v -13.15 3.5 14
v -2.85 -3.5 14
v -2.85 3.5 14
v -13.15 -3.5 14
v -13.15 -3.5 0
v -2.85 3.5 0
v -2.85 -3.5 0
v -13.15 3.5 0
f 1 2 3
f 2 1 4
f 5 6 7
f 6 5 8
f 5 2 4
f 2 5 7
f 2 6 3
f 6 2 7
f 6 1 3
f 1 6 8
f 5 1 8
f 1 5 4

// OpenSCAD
$fn=20;
MicroSwitchWidth = 5.7;// mm
MicroSwitchHeight = 6.5; // mm
MicroSwitchLength = 12.9; // mm
MicroSwitchArmLength = 13; // mm
MicroSwitchArmThickness = .1; // mm
MicroSwitchMountHolesDiameter = 2.2; // mm
MicroSwitchMountHolesOffset = 3.1; // mm

StopBlockOpening = 32; //mm		// Opening is 32mm
StopBlockWidth = StopBlockOpening / 2 - MicroSwitchWidth;
StopBlockDepth = 7; // mm
StopBlockHeight = 14; //mm


module NeckStopMount()
{
	translate([-StopBlockWidth - MicroSwitchWidth/2, -StopBlockDepth/2, 0])
		cube([StopBlockWidth, StopBlockDepth, StopBlockHeight]);
}

module Microswitch()
{
	difference()
	{
		translate([0, 0, -1.5])
		{
		rotate([15, 0, 0])
			translate([-MicroSwitchWidth/2, -MicroSwitchLength/2 + 4, MicroSwitchHeight + 1])
				cube([MicroSwitchWidth, MicroSwitchArmLength, MicroSwitchArmThickness]);
		
		translate([-MicroSwitchWidth/2, -MicroSwitchLength/2, 0])
			cube([MicroSwitchWidth, MicroSwitchLength, MicroSwitchHeight]);
		}
	
		translate([-MicroSwitchWidth,MicroSwitchMountHolesOffset,0])
			rotate([90,0,90])
				cylinder(h=MicroSwitchWidth*2, d=MicroSwitchMountHolesDiameter);

		translate([-MicroSwitchWidth,-MicroSwitchMountHolesOffset,0])
			rotate([90,0,90])
				cylinder(h=MicroSwitchWidth*2, d=MicroSwitchMountHolesDiameter);
	}
}

/*
translate([0, 0, StopBlockHeight/2])
rotate([60, 0, 0])
Microswitch();
*/
NeckStopMount();
